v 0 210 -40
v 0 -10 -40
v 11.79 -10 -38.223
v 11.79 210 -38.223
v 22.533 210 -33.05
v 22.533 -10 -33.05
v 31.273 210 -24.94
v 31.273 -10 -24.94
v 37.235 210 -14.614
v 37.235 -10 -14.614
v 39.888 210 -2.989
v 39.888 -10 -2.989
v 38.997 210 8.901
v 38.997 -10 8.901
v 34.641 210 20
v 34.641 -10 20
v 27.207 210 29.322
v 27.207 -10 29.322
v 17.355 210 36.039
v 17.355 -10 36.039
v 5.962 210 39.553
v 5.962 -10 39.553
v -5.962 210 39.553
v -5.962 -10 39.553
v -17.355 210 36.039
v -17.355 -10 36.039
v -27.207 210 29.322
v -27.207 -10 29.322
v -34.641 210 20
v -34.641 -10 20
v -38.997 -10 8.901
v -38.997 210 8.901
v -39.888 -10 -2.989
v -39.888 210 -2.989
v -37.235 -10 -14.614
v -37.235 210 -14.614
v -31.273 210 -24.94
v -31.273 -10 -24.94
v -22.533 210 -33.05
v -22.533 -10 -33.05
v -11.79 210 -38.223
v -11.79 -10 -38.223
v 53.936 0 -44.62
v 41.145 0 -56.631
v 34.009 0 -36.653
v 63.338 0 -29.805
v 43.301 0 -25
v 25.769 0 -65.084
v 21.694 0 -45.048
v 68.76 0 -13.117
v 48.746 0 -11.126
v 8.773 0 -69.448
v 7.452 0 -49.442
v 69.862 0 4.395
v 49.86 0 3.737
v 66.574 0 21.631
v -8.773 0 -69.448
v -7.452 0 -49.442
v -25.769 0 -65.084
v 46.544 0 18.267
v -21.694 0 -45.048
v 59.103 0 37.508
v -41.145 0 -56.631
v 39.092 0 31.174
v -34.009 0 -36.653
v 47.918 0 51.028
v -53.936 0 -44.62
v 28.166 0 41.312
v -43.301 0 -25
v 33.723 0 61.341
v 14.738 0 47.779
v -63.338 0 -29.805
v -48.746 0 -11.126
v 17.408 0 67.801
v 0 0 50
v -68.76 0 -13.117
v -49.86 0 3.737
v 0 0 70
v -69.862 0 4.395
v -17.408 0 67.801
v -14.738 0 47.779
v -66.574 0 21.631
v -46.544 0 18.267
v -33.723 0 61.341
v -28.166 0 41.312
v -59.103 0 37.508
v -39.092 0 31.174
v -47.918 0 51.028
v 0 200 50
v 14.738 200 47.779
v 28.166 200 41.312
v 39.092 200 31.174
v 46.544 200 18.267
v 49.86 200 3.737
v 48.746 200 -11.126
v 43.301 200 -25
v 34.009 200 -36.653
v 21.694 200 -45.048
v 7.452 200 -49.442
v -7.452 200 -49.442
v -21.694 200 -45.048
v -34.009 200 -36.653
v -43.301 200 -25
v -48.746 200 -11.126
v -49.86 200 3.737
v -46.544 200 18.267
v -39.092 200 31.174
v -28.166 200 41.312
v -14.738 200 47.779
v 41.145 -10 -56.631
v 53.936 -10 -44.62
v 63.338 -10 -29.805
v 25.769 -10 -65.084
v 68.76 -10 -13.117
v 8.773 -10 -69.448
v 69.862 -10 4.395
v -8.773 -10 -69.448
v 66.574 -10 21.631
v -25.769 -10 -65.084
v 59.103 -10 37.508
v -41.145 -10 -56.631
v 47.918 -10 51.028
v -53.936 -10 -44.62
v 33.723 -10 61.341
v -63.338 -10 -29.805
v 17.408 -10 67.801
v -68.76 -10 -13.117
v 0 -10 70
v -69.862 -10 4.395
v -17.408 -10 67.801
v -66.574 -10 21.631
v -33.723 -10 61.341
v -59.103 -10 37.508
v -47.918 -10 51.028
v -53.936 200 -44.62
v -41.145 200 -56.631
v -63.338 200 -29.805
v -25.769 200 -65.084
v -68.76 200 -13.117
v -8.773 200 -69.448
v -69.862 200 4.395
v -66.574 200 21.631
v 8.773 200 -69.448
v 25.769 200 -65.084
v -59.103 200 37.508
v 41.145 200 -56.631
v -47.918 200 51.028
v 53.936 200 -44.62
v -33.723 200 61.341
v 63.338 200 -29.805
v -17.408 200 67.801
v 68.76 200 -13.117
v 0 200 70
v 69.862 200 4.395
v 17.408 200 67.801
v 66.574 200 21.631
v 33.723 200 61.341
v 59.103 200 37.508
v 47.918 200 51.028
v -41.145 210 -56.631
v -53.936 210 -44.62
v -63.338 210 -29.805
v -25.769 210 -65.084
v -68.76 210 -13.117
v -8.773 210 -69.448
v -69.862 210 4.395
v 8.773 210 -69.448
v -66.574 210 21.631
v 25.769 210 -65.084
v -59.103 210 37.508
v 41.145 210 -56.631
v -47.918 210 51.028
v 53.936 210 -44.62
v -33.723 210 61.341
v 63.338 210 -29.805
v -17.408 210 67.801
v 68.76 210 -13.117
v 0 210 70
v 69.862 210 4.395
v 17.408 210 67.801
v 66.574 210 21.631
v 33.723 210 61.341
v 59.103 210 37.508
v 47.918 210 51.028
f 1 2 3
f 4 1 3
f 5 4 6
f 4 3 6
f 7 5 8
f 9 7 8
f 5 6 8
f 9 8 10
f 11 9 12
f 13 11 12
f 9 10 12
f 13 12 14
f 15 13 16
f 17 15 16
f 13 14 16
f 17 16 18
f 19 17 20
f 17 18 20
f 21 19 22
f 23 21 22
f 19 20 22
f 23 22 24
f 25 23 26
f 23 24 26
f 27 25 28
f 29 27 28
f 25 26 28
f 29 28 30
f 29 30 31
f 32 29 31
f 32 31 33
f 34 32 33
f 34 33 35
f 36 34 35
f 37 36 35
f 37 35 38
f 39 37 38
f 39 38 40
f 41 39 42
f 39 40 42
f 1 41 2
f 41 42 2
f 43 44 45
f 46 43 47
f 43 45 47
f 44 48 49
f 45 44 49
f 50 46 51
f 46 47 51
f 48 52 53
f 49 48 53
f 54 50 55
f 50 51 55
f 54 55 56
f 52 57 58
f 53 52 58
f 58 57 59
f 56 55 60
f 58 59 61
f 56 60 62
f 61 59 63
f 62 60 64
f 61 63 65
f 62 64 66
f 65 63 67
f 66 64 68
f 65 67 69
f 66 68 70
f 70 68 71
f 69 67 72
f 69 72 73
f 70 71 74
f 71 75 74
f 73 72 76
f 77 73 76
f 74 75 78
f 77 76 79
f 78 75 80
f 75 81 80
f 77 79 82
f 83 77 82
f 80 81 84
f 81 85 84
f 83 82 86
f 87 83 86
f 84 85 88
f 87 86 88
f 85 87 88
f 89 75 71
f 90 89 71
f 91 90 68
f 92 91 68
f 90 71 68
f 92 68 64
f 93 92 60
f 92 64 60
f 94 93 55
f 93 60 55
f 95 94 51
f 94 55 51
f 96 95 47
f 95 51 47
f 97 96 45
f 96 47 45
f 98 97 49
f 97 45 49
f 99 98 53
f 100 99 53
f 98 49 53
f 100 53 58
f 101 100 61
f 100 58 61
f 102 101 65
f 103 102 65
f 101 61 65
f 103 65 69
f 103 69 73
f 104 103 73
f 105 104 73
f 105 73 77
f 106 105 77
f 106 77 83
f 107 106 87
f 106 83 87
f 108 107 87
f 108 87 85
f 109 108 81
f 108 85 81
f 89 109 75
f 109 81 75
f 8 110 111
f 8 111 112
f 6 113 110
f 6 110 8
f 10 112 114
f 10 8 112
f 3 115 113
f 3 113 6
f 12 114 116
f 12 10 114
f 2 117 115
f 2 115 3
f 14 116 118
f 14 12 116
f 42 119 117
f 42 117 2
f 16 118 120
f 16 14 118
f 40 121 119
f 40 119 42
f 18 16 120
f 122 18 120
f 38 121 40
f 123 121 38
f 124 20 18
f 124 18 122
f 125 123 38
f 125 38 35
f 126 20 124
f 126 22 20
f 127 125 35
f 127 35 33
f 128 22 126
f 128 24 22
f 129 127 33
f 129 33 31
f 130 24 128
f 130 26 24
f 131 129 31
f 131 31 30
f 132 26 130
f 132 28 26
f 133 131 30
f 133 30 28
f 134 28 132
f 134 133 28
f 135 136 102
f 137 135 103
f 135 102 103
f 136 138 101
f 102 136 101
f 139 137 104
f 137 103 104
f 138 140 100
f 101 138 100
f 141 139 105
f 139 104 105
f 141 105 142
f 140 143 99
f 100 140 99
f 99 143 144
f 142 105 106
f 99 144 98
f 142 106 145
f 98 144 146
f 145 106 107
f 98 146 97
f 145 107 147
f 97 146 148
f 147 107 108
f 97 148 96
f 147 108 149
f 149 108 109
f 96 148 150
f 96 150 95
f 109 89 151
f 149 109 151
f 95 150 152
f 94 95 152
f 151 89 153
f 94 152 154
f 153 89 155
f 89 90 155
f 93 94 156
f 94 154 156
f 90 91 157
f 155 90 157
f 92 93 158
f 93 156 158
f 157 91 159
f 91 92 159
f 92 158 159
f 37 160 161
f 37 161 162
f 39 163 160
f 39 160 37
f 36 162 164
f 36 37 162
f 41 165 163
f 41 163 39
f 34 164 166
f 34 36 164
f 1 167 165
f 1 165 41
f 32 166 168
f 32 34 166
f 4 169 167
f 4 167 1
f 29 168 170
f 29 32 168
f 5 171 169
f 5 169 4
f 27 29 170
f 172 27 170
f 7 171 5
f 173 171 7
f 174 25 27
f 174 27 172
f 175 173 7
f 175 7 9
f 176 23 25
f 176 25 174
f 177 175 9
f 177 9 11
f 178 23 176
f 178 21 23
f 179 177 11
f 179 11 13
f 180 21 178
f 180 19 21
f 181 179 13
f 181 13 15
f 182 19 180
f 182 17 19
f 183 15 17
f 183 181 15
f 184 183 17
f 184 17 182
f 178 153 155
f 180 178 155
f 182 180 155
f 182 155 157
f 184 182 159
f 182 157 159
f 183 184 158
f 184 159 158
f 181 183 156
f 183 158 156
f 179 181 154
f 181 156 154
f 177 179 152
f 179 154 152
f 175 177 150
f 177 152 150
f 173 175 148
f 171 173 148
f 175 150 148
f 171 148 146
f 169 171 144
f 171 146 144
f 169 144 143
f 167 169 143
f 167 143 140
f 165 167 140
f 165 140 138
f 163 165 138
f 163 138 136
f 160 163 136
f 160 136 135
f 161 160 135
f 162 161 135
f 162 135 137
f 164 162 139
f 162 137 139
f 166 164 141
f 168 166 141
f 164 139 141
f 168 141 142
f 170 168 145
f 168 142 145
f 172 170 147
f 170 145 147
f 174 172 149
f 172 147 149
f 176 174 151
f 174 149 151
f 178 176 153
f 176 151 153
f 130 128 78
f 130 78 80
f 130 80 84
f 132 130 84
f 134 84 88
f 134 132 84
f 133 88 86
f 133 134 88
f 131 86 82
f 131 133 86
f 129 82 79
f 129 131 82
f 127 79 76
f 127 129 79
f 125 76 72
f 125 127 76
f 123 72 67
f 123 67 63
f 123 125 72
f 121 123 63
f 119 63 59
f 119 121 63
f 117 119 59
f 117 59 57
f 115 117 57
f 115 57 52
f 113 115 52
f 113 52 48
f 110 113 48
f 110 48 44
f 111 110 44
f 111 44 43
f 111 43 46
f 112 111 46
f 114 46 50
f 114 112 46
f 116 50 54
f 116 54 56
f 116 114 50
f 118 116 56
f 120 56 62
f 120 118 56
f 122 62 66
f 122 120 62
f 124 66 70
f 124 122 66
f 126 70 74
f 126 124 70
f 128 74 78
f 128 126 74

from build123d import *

# Parameters (mm, degrees)
ESBO_O1_R                = 50
RESSALTO_EXTRUS_O2_DEPTH = 200
ESBO_O5_R                = 70
RESSALTO_EXTRUS_O3_DEPTH = 10
RESSALTO_EXTRUS_O4_START = 10
ESBO_O6_R                = 70
RESSALTO_EXTRUS_O4_DEPTH = 10
ESBO_O7_R                = 40
CORTE_EXTRUS_O3_DEPTH    = 220


with BuildPart() as part:
    # Esboço1 → Ressalto-extrusão2 (new body)
    with BuildSketch(Plane(origin=(0, 0, 0), x_dir=(1, 0, 0), z_dir=(0, 1, 0))):
        with Locations(Location((0, 0, 0), (0, 0, 270))):
            Circle(ESBO_O1_R)
    extrude(amount=RESSALTO_EXTRUS_O2_DEPTH)

    # Esboço5 → Ressalto-extrusão3 (add)
    with BuildSketch(Plane(origin=(0, 200, 0), x_dir=(1, 0, 0), z_dir=(0, 1, 0))):
        with Locations(Location((0, 0, 0), (0, 0, 270))):
            Circle(ESBO_O5_R)
    extrude(amount=RESSALTO_EXTRUS_O3_DEPTH)

    # Esboço6 → Ressalto-extrusão4 (add)
    with BuildSketch(Plane(origin=(0, 0, 0), x_dir=(-1, 0, 0), z_dir=(0, -1, 0)).offset(RESSALTO_EXTRUS_O4_START)):
        with Locations(Location((0, 0, 0), (0, 0, 270))):
            Circle(ESBO_O6_R)
    extrude(amount=-RESSALTO_EXTRUS_O4_DEPTH)

    # Esboço7 → Corte-extrusão3 (cut)
    with BuildSketch(Plane(origin=(0, -10, 0), x_dir=(-1, 0, 0), z_dir=(0, -1, 0))):
        with Locations(Location((0, 0, 0), (0, 0, 90))):
            Circle(ESBO_O7_R)
    extrude(amount=-CORTE_EXTRUS_O3_DEPTH, mode=Mode.SUBTRACT)


solid = part.part
